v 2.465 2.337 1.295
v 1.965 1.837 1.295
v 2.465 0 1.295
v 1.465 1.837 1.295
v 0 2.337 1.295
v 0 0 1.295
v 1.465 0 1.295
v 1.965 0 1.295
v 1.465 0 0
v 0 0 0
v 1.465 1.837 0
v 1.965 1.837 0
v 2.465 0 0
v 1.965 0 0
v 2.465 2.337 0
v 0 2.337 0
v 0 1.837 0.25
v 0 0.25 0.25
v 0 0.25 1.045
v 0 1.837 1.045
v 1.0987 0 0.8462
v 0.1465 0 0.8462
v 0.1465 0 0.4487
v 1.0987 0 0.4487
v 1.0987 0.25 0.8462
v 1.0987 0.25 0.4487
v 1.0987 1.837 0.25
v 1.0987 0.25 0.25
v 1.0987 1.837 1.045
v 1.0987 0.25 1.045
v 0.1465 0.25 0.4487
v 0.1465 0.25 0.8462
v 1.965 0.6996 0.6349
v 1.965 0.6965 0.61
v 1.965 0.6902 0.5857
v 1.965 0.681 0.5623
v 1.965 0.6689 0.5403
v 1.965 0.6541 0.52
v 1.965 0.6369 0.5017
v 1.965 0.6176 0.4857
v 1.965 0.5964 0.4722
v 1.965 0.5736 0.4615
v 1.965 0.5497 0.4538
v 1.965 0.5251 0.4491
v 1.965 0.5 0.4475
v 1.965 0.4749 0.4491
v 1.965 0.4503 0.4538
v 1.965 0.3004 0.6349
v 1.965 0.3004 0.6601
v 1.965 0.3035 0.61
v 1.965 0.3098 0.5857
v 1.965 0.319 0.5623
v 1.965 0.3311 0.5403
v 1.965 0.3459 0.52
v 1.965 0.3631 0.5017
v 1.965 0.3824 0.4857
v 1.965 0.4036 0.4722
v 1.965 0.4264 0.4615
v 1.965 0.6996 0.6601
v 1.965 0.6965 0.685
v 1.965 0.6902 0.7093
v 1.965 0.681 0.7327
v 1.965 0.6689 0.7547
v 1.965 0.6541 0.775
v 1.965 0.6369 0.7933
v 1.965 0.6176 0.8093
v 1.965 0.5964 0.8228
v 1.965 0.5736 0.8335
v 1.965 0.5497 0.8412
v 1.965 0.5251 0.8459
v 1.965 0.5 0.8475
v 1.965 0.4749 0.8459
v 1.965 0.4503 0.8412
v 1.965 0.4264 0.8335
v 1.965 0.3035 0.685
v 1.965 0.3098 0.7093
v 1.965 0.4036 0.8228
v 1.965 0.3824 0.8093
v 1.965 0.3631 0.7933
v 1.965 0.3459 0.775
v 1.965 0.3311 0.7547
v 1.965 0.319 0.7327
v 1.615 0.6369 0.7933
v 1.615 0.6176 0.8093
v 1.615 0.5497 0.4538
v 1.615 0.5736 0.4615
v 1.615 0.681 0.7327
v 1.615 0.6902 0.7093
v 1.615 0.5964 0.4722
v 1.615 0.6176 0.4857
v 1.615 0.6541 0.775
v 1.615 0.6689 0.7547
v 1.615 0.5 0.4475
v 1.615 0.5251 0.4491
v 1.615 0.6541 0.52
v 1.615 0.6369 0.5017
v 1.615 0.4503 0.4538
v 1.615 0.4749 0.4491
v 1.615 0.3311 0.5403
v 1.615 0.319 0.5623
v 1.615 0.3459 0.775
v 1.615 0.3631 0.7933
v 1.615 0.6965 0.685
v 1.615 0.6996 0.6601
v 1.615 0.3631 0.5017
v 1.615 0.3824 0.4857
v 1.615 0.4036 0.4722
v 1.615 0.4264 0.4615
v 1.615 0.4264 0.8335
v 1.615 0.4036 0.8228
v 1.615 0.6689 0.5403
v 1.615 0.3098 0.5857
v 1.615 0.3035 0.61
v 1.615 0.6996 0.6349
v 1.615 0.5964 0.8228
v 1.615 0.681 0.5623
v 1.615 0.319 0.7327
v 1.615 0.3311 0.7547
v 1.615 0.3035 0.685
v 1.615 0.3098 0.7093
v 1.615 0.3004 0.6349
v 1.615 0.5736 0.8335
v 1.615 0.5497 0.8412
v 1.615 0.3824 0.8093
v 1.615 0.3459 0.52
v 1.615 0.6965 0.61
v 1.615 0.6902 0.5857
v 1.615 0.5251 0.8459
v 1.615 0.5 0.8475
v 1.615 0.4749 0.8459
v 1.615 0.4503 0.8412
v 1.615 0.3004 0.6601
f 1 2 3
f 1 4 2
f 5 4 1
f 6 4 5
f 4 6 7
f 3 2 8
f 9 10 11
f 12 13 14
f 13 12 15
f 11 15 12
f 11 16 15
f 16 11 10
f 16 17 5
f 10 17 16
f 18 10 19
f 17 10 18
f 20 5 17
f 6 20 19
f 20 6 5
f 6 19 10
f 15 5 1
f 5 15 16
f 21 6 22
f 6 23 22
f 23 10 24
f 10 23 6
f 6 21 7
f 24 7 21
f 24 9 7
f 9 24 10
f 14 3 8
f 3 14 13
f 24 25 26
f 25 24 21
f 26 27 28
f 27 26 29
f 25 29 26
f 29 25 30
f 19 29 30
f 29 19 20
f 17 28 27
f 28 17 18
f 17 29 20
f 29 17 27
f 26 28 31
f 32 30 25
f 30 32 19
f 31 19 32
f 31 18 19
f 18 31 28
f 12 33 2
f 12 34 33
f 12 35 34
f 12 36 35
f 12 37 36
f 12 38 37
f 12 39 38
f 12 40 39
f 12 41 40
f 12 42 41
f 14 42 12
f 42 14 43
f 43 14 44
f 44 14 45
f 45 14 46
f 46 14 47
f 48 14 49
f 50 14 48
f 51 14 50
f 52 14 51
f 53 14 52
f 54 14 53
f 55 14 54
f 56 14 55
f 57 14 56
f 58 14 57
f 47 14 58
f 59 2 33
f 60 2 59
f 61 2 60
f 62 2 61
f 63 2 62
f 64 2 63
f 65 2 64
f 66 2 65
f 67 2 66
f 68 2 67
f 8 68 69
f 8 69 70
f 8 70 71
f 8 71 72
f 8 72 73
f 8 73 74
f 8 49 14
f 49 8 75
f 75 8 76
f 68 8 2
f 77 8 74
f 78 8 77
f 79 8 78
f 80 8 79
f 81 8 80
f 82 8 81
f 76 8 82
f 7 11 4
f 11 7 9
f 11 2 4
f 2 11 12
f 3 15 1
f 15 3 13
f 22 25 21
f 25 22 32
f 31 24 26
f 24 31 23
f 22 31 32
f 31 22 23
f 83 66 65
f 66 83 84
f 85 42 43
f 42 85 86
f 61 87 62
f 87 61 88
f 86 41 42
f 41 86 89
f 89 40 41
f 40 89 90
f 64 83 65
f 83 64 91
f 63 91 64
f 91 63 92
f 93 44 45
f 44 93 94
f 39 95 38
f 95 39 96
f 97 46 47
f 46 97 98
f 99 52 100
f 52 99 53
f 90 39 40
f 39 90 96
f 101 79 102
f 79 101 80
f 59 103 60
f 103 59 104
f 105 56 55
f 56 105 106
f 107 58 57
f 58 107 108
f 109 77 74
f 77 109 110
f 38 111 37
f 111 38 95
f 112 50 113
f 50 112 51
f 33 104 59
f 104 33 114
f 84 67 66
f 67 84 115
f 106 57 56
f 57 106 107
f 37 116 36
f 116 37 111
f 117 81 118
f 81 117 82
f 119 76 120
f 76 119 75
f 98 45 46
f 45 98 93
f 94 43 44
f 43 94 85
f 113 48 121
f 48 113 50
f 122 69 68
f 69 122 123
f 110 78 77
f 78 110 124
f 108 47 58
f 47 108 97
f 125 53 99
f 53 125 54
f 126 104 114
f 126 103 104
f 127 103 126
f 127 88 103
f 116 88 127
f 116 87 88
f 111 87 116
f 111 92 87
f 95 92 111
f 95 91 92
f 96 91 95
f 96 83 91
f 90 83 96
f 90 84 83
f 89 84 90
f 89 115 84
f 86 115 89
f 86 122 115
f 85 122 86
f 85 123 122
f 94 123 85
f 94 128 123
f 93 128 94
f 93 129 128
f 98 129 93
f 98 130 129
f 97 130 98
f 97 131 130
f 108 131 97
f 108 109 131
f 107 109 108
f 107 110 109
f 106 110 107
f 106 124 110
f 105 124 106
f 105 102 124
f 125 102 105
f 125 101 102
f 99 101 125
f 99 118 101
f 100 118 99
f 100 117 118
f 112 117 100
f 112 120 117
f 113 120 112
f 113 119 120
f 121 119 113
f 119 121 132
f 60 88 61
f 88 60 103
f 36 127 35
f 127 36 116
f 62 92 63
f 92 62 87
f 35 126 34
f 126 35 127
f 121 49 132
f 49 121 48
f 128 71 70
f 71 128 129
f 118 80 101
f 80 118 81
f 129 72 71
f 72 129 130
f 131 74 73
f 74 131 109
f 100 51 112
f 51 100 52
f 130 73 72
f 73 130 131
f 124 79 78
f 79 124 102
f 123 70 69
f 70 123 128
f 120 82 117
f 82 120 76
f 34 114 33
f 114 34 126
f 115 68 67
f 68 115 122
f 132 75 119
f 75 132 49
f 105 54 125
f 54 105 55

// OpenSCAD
$fn = 50;

module shoulderServoBracket(){
  servoWidth = 0.795;
  servoLength = 1.587;
  servoHeight = 1.465;
  bracketThickness = 0.25;
  cylinderRadius = 0.2;
  cylinderHeight = 0.35;
  servoHornLocation = 0.25;
  bracketCutOut = servoLength + bracketThickness;
  union(){
    difference(){
    //main bracket block
    cube([2*servoHeight,servoLength+3*bracketThickness, servoWidth + 2*bracketThickness]);
    //servo cutout
    translate([-0.25 * servoHeight,bracketThickness,bracketThickness])
      cube([servoHeight,servoLength,servoWidth]);
    //cutout for arm bracket mount
    translate([servoHeight,0,0])
      cube([0.5,bracketCutOut,servoWidth + 2*bracketThickness]);
    //cut off end of bracket
    translate([servoHeight+2*bracketThickness+0.5,0,0])
      cube([2,servoLength+3*bracketThickness,servoWidth + 2*bracketThickness]);
    // cut out hole for wire
    translate([0.10*servoHeight,0,0.25*servoWidth + bracketThickness])
      cube([servoHeight*0.65,bracketThickness,servoWidth/2]);
    }
    //add cylinder for arm bracket
    translate([servoHeight+0.5-cylinderHeight,servoHornLocation + bracketThickness,0.5*(2*bracketThickness + servoWidth)])
      rotate([0,90,0])
        cylinder(r=cylinderRadius,h=cylinderHeight);
    //support for cylinder
    //comment one of two depending on orientation of print
    //translate([servoHeight+0.45 - cylinderHeight,servoHornLocation + bracketThickness,0])
    //  cube([cylinderHeight,0.1,0.5*(2*bracketThickness + servoWidth)]);
    //translate([servoHeight+0.45 -cylinderHeight,servoHornLocation + bracketThickness,0.5*(2*bracketThickness + servoWidth)])
    //  cube([cylinderHeight,servoLength-servoHornLocation,0.1]);
  }
}
shoulderServoBracket();
